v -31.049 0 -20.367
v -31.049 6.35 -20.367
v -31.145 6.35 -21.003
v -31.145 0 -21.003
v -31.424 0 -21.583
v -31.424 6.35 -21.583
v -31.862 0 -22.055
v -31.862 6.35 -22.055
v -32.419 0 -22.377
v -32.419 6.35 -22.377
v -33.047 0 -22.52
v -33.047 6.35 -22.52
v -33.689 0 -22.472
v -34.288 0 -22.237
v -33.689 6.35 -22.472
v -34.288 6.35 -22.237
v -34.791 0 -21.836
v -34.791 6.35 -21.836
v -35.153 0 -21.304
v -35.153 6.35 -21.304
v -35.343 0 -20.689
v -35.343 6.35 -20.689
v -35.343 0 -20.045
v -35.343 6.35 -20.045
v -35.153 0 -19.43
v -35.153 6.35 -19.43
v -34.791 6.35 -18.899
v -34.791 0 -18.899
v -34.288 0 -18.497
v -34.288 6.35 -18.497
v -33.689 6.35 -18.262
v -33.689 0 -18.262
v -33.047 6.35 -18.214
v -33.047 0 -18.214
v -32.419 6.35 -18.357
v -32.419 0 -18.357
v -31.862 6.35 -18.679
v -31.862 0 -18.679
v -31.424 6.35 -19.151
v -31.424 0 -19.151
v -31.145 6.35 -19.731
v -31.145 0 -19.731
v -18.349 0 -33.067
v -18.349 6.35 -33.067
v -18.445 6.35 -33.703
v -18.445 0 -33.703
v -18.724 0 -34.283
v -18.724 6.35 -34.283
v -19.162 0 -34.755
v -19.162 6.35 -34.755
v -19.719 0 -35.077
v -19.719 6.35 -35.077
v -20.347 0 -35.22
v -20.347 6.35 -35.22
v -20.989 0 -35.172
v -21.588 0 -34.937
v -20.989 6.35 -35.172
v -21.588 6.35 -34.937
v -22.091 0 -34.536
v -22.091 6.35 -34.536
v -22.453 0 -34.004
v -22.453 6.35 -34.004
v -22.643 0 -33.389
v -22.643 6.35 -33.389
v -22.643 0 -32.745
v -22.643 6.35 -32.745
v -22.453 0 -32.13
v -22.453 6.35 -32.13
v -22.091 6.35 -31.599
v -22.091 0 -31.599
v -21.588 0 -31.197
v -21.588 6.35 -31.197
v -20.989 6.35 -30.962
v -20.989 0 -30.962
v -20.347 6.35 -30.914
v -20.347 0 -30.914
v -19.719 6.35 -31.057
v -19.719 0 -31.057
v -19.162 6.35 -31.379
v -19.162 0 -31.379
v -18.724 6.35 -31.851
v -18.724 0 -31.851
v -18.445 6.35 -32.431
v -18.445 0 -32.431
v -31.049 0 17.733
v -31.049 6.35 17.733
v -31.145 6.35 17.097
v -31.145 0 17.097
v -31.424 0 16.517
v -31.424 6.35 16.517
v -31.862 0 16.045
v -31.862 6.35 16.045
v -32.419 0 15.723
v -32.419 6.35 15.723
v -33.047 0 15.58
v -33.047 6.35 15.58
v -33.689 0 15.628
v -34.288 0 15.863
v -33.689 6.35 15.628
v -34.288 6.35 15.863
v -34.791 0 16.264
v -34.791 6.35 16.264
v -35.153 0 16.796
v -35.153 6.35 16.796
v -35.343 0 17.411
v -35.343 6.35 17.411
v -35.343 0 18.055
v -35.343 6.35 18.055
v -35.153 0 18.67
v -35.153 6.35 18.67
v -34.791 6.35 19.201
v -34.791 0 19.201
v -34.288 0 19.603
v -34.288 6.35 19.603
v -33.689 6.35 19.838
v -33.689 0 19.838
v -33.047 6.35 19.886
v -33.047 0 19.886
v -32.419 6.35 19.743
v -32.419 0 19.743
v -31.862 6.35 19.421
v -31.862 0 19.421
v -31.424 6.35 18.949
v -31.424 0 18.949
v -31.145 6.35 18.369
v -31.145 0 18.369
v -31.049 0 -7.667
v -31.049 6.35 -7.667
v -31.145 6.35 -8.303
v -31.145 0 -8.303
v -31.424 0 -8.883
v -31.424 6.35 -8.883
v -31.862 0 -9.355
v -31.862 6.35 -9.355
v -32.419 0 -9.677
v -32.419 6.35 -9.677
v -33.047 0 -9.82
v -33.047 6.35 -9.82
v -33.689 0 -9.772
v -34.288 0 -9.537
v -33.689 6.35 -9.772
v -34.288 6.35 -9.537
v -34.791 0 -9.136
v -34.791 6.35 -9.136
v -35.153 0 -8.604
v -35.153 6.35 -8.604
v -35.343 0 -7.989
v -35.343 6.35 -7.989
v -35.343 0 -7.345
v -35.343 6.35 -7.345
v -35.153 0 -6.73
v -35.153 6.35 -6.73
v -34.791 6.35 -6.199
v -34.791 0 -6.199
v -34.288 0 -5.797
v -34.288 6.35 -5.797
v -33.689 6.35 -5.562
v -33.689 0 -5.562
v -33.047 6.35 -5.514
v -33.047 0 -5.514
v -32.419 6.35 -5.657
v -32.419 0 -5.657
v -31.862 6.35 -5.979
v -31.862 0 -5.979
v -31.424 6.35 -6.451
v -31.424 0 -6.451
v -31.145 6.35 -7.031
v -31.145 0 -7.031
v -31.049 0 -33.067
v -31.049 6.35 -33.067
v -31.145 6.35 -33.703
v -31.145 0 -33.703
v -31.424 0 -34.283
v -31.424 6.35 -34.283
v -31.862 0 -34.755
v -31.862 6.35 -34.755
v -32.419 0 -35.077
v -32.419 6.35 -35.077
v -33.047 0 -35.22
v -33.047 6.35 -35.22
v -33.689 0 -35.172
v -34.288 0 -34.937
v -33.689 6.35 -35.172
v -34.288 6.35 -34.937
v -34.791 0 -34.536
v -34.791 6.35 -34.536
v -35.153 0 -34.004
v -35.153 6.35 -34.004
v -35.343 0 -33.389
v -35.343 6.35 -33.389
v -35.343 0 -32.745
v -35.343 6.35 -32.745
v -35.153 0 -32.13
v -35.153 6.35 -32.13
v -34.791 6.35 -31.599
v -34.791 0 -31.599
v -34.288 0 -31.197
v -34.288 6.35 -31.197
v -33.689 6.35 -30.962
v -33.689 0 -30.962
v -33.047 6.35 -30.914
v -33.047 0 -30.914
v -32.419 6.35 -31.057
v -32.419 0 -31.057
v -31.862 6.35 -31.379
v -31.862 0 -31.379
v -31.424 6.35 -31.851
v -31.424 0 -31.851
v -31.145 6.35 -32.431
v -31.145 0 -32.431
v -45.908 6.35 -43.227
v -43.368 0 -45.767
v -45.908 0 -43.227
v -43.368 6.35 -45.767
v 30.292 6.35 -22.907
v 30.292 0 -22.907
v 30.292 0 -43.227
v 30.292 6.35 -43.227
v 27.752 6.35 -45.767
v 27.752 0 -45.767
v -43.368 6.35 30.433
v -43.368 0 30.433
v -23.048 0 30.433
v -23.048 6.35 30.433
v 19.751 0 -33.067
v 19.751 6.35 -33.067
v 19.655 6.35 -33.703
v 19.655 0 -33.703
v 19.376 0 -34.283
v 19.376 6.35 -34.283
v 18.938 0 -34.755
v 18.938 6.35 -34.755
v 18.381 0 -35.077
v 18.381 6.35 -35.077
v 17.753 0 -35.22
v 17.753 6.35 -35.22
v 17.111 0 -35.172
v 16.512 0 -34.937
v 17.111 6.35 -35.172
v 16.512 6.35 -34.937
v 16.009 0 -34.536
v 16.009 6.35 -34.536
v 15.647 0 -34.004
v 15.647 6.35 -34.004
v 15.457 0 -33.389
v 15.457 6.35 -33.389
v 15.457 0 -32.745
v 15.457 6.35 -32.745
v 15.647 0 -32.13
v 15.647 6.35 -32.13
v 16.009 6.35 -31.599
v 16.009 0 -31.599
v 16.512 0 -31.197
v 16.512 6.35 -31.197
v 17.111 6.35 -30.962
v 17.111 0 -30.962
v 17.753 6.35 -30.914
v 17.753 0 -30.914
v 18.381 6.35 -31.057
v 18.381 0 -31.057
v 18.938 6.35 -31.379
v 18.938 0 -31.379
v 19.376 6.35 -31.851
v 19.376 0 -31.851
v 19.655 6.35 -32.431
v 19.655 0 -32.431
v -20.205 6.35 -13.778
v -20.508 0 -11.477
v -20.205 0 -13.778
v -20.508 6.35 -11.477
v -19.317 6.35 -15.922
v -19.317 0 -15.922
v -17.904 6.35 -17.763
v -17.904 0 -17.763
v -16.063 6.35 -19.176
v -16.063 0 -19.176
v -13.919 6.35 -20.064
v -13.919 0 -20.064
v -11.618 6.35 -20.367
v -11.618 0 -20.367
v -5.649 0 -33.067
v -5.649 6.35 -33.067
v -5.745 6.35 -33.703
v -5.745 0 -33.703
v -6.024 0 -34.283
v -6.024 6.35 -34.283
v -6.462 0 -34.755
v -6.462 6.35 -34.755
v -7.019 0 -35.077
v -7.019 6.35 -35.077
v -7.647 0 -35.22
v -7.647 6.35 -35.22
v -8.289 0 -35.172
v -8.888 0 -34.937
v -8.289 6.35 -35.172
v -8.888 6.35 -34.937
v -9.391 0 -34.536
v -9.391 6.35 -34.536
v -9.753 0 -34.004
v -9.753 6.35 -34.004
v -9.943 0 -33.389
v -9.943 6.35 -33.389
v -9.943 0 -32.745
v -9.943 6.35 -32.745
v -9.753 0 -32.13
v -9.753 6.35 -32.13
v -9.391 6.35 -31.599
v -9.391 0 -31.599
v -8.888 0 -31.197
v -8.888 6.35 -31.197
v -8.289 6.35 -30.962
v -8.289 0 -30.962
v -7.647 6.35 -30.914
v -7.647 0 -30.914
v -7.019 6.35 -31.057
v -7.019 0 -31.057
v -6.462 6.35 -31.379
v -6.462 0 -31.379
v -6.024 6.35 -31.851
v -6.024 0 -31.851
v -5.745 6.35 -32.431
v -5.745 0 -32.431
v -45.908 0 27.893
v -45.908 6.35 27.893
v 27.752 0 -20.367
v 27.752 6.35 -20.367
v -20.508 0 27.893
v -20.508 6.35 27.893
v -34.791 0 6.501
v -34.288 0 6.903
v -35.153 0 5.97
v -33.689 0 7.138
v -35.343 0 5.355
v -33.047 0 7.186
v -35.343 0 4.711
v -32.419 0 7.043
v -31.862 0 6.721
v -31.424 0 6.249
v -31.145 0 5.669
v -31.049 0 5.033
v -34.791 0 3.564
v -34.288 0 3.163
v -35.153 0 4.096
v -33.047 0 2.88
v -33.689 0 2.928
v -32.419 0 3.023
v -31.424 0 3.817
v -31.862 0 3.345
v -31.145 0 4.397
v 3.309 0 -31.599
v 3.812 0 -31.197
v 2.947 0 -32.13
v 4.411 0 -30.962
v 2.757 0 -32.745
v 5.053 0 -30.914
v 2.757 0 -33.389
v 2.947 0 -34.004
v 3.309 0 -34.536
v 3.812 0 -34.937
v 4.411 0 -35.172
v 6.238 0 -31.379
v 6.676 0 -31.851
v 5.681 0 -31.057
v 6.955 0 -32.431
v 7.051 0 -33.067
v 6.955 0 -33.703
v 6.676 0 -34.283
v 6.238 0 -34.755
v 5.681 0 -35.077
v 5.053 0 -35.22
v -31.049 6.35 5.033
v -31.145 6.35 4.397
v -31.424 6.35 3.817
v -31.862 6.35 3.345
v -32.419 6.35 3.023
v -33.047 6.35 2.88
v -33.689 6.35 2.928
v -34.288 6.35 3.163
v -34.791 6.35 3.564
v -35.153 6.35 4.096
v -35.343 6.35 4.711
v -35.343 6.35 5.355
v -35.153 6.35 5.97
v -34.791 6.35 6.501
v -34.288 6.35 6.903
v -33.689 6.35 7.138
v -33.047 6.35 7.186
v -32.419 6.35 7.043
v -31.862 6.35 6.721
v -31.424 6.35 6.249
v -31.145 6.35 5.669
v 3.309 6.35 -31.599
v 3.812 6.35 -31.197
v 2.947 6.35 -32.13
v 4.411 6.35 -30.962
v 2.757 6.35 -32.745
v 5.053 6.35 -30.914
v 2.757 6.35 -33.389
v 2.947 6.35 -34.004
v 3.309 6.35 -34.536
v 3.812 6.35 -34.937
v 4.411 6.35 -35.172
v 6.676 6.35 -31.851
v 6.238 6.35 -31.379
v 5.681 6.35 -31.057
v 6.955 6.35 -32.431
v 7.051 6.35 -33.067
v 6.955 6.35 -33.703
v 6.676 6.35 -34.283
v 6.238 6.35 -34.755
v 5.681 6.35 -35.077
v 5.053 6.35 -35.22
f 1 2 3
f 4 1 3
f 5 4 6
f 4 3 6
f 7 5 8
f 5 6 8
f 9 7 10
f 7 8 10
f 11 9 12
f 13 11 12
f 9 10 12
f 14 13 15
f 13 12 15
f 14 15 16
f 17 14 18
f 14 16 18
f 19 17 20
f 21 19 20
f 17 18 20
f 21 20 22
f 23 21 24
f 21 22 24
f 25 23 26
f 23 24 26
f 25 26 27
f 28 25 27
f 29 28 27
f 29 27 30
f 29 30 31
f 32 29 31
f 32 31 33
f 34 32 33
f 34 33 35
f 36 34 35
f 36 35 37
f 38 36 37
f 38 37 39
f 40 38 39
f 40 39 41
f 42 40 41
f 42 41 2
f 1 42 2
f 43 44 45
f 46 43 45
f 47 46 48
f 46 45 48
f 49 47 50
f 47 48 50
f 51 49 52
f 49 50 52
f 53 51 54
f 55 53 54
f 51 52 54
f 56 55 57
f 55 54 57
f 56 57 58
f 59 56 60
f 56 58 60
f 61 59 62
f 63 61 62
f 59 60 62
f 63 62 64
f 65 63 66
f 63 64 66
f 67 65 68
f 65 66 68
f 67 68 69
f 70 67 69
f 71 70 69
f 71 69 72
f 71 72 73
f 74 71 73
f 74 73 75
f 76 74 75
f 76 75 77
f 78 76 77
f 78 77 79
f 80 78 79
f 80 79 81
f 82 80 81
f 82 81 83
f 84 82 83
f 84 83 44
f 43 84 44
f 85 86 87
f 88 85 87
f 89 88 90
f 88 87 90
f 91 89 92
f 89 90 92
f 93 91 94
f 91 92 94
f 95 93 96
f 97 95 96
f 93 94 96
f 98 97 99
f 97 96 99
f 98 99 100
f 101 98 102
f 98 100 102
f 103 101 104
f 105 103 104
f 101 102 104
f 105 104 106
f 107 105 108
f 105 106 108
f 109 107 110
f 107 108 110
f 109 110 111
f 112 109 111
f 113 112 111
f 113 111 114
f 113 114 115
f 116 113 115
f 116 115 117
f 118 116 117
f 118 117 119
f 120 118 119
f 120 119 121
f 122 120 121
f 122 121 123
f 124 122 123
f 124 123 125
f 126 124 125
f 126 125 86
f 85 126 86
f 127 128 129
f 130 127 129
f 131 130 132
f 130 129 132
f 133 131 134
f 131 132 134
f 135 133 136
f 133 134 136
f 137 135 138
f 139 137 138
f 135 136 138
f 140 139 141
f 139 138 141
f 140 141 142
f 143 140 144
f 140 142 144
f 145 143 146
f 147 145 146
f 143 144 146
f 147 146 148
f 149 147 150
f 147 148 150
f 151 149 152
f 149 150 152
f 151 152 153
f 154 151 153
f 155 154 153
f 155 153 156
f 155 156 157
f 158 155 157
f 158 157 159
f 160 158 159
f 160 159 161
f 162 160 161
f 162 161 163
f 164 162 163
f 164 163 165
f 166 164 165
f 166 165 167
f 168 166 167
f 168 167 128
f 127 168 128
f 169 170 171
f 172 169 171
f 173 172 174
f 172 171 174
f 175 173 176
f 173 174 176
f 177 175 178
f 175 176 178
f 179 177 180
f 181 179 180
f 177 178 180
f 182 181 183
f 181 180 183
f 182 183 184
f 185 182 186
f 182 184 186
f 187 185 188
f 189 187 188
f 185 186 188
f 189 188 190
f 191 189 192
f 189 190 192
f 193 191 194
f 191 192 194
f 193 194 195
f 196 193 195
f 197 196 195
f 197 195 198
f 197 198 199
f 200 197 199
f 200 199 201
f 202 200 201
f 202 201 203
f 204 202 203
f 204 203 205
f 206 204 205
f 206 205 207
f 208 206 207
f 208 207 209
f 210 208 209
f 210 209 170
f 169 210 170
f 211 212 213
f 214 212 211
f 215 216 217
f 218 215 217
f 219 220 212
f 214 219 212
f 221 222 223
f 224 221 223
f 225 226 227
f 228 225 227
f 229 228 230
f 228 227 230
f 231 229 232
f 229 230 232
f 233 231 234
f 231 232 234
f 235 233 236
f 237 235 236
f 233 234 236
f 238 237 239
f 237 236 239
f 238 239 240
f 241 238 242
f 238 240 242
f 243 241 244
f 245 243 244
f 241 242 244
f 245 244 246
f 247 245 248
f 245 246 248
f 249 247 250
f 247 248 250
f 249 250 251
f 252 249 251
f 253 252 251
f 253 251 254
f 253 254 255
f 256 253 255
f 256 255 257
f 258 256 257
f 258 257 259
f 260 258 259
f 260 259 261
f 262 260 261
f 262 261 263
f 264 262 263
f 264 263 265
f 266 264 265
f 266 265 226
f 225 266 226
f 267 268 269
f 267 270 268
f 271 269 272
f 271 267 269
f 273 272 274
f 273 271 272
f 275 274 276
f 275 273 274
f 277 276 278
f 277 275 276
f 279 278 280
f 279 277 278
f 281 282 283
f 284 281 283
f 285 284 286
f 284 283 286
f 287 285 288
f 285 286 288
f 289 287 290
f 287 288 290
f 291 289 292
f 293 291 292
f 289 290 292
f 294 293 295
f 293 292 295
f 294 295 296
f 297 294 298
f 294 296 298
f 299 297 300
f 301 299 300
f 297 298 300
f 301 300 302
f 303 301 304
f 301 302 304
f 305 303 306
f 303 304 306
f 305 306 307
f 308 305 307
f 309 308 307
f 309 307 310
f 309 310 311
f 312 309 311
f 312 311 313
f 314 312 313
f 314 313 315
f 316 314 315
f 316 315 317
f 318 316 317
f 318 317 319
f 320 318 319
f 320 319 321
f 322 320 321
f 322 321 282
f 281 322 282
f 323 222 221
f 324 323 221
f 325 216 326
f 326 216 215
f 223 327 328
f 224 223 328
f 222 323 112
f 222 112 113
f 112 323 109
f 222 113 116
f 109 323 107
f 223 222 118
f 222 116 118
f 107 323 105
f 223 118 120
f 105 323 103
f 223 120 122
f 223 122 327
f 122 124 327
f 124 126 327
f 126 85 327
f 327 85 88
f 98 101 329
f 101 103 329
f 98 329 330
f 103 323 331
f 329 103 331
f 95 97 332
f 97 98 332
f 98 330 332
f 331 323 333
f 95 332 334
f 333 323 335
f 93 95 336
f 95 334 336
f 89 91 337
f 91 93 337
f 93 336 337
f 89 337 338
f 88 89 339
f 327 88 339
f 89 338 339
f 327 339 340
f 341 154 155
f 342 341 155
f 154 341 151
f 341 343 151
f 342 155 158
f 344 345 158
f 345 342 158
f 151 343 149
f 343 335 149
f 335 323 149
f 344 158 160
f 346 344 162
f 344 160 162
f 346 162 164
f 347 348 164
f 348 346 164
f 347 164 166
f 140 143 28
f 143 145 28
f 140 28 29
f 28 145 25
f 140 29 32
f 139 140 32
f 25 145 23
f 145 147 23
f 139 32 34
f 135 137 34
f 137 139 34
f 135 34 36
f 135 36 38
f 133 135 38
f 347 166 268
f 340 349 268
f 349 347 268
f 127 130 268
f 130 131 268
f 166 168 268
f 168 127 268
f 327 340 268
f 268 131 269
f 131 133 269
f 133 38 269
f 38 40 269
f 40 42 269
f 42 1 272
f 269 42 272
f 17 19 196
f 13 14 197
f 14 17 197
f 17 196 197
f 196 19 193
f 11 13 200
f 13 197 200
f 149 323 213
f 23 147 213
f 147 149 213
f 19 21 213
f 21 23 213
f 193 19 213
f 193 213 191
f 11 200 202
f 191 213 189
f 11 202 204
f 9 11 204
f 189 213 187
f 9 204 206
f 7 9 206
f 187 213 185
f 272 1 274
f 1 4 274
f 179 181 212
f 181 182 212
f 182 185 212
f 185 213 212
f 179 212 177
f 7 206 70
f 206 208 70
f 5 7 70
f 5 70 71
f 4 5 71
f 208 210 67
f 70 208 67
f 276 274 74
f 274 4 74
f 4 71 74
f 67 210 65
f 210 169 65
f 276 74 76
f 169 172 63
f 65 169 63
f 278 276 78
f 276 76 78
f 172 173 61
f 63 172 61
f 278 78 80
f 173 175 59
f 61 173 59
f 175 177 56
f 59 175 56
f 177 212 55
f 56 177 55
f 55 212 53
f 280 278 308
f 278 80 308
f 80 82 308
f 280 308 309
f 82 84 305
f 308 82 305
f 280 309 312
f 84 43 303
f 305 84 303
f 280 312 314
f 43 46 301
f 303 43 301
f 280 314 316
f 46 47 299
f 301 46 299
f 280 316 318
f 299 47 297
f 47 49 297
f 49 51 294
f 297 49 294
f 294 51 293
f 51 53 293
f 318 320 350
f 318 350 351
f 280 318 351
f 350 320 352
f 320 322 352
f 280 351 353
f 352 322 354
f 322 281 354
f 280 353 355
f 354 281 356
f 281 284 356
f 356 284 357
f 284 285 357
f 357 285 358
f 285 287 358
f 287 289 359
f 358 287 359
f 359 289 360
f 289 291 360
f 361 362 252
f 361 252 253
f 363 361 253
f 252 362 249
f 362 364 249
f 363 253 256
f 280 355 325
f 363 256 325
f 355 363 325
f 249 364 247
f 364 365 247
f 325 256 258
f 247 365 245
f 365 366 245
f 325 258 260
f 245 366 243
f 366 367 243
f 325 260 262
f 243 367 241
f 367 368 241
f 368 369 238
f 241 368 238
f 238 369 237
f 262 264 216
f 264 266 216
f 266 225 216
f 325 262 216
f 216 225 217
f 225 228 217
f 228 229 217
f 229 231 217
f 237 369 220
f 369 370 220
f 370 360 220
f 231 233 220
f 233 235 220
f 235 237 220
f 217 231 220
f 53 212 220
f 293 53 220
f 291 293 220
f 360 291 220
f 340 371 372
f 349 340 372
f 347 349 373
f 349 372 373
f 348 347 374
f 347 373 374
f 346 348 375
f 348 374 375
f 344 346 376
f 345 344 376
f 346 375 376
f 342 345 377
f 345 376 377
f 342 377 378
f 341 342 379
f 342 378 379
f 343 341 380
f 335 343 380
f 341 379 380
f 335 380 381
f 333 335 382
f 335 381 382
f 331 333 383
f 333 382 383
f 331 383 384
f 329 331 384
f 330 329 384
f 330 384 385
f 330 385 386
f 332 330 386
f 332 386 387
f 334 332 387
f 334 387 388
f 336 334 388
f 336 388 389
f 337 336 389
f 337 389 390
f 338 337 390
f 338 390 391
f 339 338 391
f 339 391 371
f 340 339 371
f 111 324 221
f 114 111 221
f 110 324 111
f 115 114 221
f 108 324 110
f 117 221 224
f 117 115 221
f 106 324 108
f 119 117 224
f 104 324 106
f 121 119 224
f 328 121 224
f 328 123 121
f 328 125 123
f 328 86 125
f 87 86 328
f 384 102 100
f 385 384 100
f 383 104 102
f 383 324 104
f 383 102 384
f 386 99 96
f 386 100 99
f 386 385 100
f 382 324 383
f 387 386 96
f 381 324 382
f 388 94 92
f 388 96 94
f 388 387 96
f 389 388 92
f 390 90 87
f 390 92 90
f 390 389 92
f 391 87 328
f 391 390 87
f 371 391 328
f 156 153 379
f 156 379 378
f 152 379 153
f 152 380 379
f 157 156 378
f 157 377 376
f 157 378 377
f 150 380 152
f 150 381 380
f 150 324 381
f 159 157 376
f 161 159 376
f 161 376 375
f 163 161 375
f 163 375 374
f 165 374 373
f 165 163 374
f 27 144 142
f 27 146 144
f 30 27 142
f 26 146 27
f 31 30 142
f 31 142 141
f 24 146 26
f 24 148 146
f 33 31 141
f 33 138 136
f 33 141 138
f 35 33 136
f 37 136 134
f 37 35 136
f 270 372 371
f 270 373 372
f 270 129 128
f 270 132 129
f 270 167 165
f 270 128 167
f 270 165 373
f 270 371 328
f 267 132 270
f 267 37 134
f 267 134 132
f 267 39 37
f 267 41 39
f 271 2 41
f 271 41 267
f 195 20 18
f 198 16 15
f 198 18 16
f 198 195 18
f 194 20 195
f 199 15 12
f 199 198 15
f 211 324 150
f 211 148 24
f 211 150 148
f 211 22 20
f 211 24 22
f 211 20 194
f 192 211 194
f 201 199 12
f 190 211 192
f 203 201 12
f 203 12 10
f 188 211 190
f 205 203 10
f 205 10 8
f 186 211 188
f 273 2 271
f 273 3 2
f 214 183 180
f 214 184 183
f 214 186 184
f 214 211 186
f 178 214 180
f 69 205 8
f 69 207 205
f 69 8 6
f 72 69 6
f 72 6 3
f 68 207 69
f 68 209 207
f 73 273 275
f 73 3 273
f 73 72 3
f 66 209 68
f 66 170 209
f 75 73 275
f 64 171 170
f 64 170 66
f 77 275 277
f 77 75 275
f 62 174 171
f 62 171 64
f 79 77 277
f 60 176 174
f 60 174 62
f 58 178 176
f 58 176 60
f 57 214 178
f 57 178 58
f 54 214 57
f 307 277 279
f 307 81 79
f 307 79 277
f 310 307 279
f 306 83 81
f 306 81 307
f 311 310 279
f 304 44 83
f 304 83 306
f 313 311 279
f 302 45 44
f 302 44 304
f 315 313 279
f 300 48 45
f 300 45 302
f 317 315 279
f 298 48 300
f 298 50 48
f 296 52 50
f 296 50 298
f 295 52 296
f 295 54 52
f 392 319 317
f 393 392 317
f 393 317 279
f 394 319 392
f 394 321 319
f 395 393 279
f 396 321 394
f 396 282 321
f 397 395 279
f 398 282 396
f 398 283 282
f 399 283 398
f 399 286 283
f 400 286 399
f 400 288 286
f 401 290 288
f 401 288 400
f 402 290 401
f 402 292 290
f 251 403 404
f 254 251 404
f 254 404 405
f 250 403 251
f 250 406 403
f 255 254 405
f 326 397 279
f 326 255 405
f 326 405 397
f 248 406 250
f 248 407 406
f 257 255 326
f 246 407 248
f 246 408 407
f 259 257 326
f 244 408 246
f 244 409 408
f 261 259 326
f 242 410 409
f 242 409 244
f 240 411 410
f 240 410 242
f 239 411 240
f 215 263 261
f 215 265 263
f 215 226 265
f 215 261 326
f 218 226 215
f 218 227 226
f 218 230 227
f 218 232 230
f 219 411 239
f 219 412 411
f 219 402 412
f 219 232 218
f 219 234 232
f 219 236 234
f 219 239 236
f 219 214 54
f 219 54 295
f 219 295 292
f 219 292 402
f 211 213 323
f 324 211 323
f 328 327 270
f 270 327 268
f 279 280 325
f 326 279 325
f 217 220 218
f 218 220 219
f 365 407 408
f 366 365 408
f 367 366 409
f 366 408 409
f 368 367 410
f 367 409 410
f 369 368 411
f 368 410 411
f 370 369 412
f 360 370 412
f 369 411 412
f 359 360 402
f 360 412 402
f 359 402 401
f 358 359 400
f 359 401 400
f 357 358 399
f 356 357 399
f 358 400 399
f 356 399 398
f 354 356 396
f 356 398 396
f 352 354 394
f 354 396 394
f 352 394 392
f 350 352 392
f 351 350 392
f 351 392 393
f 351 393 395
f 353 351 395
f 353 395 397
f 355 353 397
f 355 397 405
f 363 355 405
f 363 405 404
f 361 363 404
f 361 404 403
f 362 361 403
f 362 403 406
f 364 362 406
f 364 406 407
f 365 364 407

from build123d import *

# Parameters (mm, degrees)
BOSS_EXTRUDE1_DEPTH = 6.35
CHAMFER9_SIZE       = 2.54
CHAMFER10_SIZE      = 2.54
CHAMFER11_SIZE      = 2.54
CHAMFER12_SIZE      = 2.54
CHAMFER13_SIZE      = 2.54
FILLET1_R           = 8.89
SKETCH2_R           = 2.159
CUT_EXTRUDE1_DEPTH  = 7.35


with BuildPart() as part:
    # Sketch1 → Boss-Extrude1 (new body)
    with BuildSketch(Plane(origin=(0, 0, 0), x_dir=(1, 0, 0), z_dir=(0, 1, 0))):
        Polygon((-45.908148148, -30.432962963), (-20.508148148, -30.432962963), (-20.508148148, 20.367037037), (30.291851852, 20.367037037), (30.291851852, 45.767037037), (-20.508148148, 45.767037037), (-45.908148148, 45.767037037), (-45.908148148, 20.367037037), align=None)
    extrude(amount=BOSS_EXTRUDE1_DEPTH)

    # Chamfer9
    chamfer9_edges = [part.edges().sort_by_distance(p)[0] for p in [
        (-20.508148148, 3.175, 30.432962963),
    ]]
    chamfer(chamfer9_edges, length=CHAMFER9_SIZE)

    # Chamfer10
    chamfer10_edges = [part.edges().sort_by_distance(p)[0] for p in [
        (30.291851852, 3.175, -20.367037037),
    ]]
    chamfer(chamfer10_edges, length=CHAMFER10_SIZE)

    # Chamfer11
    chamfer11_edges = [part.edges().sort_by_distance(p)[0] for p in [
        (30.291851852, 3.175, -45.767037037),
    ]]
    chamfer(chamfer11_edges, length=CHAMFER11_SIZE)

    # Chamfer12
    chamfer12_edges = [part.edges().sort_by_distance(p)[0] for p in [
        (-45.908148148, 3.175, 30.432962963),
    ]]
    chamfer(chamfer12_edges, length=CHAMFER12_SIZE)

    # Chamfer13
    chamfer13_edges = [part.edges().sort_by_distance(p)[0] for p in [
        (-45.908148148, 3.175, -45.767037037),
    ]]
    chamfer(chamfer13_edges, length=CHAMFER13_SIZE)

    # Fillet1
    fillet1_edges = [part.edges().sort_by_distance(p)[0] for p in [
        (-20.508148148, 3.175, -20.367037037),
    ]]
    fillet(fillet1_edges, radius=FILLET1_R)

    # Sketch2 → Cut-Extrude1 (cut, through all)
    with BuildSketch(Plane(origin=(0, 6.35, 0), x_dir=(1, 0, 0), z_dir=(0, 1, 0))):
        with Locations((-33.208148148, 33.067037037)):
            Circle(SKETCH2_R)
        with Locations((-20.508148148, 33.067037037)):
            Circle(SKETCH2_R)
        with Locations((-7.808148148, 33.067037037)):
            Circle(SKETCH2_R)
        with Locations((4.891851852, 33.067037037)):
            Circle(SKETCH2_R)
        with Locations((17.591851852, 33.067037037)):
            Circle(SKETCH2_R)
        with Locations((-33.208148148, 20.367037037)):
            Circle(SKETCH2_R)
        with Locations((-33.208148148, 7.667037037)):
            Circle(SKETCH2_R)
        with Locations((-33.208148148, -5.032962963)):
            Circle(SKETCH2_R)
        with Locations((-33.208148148, -17.732962963)):
            Circle(SKETCH2_R)
    extrude(amount=-CUT_EXTRUDE1_DEPTH, mode=Mode.SUBTRACT)


solid = part.part
